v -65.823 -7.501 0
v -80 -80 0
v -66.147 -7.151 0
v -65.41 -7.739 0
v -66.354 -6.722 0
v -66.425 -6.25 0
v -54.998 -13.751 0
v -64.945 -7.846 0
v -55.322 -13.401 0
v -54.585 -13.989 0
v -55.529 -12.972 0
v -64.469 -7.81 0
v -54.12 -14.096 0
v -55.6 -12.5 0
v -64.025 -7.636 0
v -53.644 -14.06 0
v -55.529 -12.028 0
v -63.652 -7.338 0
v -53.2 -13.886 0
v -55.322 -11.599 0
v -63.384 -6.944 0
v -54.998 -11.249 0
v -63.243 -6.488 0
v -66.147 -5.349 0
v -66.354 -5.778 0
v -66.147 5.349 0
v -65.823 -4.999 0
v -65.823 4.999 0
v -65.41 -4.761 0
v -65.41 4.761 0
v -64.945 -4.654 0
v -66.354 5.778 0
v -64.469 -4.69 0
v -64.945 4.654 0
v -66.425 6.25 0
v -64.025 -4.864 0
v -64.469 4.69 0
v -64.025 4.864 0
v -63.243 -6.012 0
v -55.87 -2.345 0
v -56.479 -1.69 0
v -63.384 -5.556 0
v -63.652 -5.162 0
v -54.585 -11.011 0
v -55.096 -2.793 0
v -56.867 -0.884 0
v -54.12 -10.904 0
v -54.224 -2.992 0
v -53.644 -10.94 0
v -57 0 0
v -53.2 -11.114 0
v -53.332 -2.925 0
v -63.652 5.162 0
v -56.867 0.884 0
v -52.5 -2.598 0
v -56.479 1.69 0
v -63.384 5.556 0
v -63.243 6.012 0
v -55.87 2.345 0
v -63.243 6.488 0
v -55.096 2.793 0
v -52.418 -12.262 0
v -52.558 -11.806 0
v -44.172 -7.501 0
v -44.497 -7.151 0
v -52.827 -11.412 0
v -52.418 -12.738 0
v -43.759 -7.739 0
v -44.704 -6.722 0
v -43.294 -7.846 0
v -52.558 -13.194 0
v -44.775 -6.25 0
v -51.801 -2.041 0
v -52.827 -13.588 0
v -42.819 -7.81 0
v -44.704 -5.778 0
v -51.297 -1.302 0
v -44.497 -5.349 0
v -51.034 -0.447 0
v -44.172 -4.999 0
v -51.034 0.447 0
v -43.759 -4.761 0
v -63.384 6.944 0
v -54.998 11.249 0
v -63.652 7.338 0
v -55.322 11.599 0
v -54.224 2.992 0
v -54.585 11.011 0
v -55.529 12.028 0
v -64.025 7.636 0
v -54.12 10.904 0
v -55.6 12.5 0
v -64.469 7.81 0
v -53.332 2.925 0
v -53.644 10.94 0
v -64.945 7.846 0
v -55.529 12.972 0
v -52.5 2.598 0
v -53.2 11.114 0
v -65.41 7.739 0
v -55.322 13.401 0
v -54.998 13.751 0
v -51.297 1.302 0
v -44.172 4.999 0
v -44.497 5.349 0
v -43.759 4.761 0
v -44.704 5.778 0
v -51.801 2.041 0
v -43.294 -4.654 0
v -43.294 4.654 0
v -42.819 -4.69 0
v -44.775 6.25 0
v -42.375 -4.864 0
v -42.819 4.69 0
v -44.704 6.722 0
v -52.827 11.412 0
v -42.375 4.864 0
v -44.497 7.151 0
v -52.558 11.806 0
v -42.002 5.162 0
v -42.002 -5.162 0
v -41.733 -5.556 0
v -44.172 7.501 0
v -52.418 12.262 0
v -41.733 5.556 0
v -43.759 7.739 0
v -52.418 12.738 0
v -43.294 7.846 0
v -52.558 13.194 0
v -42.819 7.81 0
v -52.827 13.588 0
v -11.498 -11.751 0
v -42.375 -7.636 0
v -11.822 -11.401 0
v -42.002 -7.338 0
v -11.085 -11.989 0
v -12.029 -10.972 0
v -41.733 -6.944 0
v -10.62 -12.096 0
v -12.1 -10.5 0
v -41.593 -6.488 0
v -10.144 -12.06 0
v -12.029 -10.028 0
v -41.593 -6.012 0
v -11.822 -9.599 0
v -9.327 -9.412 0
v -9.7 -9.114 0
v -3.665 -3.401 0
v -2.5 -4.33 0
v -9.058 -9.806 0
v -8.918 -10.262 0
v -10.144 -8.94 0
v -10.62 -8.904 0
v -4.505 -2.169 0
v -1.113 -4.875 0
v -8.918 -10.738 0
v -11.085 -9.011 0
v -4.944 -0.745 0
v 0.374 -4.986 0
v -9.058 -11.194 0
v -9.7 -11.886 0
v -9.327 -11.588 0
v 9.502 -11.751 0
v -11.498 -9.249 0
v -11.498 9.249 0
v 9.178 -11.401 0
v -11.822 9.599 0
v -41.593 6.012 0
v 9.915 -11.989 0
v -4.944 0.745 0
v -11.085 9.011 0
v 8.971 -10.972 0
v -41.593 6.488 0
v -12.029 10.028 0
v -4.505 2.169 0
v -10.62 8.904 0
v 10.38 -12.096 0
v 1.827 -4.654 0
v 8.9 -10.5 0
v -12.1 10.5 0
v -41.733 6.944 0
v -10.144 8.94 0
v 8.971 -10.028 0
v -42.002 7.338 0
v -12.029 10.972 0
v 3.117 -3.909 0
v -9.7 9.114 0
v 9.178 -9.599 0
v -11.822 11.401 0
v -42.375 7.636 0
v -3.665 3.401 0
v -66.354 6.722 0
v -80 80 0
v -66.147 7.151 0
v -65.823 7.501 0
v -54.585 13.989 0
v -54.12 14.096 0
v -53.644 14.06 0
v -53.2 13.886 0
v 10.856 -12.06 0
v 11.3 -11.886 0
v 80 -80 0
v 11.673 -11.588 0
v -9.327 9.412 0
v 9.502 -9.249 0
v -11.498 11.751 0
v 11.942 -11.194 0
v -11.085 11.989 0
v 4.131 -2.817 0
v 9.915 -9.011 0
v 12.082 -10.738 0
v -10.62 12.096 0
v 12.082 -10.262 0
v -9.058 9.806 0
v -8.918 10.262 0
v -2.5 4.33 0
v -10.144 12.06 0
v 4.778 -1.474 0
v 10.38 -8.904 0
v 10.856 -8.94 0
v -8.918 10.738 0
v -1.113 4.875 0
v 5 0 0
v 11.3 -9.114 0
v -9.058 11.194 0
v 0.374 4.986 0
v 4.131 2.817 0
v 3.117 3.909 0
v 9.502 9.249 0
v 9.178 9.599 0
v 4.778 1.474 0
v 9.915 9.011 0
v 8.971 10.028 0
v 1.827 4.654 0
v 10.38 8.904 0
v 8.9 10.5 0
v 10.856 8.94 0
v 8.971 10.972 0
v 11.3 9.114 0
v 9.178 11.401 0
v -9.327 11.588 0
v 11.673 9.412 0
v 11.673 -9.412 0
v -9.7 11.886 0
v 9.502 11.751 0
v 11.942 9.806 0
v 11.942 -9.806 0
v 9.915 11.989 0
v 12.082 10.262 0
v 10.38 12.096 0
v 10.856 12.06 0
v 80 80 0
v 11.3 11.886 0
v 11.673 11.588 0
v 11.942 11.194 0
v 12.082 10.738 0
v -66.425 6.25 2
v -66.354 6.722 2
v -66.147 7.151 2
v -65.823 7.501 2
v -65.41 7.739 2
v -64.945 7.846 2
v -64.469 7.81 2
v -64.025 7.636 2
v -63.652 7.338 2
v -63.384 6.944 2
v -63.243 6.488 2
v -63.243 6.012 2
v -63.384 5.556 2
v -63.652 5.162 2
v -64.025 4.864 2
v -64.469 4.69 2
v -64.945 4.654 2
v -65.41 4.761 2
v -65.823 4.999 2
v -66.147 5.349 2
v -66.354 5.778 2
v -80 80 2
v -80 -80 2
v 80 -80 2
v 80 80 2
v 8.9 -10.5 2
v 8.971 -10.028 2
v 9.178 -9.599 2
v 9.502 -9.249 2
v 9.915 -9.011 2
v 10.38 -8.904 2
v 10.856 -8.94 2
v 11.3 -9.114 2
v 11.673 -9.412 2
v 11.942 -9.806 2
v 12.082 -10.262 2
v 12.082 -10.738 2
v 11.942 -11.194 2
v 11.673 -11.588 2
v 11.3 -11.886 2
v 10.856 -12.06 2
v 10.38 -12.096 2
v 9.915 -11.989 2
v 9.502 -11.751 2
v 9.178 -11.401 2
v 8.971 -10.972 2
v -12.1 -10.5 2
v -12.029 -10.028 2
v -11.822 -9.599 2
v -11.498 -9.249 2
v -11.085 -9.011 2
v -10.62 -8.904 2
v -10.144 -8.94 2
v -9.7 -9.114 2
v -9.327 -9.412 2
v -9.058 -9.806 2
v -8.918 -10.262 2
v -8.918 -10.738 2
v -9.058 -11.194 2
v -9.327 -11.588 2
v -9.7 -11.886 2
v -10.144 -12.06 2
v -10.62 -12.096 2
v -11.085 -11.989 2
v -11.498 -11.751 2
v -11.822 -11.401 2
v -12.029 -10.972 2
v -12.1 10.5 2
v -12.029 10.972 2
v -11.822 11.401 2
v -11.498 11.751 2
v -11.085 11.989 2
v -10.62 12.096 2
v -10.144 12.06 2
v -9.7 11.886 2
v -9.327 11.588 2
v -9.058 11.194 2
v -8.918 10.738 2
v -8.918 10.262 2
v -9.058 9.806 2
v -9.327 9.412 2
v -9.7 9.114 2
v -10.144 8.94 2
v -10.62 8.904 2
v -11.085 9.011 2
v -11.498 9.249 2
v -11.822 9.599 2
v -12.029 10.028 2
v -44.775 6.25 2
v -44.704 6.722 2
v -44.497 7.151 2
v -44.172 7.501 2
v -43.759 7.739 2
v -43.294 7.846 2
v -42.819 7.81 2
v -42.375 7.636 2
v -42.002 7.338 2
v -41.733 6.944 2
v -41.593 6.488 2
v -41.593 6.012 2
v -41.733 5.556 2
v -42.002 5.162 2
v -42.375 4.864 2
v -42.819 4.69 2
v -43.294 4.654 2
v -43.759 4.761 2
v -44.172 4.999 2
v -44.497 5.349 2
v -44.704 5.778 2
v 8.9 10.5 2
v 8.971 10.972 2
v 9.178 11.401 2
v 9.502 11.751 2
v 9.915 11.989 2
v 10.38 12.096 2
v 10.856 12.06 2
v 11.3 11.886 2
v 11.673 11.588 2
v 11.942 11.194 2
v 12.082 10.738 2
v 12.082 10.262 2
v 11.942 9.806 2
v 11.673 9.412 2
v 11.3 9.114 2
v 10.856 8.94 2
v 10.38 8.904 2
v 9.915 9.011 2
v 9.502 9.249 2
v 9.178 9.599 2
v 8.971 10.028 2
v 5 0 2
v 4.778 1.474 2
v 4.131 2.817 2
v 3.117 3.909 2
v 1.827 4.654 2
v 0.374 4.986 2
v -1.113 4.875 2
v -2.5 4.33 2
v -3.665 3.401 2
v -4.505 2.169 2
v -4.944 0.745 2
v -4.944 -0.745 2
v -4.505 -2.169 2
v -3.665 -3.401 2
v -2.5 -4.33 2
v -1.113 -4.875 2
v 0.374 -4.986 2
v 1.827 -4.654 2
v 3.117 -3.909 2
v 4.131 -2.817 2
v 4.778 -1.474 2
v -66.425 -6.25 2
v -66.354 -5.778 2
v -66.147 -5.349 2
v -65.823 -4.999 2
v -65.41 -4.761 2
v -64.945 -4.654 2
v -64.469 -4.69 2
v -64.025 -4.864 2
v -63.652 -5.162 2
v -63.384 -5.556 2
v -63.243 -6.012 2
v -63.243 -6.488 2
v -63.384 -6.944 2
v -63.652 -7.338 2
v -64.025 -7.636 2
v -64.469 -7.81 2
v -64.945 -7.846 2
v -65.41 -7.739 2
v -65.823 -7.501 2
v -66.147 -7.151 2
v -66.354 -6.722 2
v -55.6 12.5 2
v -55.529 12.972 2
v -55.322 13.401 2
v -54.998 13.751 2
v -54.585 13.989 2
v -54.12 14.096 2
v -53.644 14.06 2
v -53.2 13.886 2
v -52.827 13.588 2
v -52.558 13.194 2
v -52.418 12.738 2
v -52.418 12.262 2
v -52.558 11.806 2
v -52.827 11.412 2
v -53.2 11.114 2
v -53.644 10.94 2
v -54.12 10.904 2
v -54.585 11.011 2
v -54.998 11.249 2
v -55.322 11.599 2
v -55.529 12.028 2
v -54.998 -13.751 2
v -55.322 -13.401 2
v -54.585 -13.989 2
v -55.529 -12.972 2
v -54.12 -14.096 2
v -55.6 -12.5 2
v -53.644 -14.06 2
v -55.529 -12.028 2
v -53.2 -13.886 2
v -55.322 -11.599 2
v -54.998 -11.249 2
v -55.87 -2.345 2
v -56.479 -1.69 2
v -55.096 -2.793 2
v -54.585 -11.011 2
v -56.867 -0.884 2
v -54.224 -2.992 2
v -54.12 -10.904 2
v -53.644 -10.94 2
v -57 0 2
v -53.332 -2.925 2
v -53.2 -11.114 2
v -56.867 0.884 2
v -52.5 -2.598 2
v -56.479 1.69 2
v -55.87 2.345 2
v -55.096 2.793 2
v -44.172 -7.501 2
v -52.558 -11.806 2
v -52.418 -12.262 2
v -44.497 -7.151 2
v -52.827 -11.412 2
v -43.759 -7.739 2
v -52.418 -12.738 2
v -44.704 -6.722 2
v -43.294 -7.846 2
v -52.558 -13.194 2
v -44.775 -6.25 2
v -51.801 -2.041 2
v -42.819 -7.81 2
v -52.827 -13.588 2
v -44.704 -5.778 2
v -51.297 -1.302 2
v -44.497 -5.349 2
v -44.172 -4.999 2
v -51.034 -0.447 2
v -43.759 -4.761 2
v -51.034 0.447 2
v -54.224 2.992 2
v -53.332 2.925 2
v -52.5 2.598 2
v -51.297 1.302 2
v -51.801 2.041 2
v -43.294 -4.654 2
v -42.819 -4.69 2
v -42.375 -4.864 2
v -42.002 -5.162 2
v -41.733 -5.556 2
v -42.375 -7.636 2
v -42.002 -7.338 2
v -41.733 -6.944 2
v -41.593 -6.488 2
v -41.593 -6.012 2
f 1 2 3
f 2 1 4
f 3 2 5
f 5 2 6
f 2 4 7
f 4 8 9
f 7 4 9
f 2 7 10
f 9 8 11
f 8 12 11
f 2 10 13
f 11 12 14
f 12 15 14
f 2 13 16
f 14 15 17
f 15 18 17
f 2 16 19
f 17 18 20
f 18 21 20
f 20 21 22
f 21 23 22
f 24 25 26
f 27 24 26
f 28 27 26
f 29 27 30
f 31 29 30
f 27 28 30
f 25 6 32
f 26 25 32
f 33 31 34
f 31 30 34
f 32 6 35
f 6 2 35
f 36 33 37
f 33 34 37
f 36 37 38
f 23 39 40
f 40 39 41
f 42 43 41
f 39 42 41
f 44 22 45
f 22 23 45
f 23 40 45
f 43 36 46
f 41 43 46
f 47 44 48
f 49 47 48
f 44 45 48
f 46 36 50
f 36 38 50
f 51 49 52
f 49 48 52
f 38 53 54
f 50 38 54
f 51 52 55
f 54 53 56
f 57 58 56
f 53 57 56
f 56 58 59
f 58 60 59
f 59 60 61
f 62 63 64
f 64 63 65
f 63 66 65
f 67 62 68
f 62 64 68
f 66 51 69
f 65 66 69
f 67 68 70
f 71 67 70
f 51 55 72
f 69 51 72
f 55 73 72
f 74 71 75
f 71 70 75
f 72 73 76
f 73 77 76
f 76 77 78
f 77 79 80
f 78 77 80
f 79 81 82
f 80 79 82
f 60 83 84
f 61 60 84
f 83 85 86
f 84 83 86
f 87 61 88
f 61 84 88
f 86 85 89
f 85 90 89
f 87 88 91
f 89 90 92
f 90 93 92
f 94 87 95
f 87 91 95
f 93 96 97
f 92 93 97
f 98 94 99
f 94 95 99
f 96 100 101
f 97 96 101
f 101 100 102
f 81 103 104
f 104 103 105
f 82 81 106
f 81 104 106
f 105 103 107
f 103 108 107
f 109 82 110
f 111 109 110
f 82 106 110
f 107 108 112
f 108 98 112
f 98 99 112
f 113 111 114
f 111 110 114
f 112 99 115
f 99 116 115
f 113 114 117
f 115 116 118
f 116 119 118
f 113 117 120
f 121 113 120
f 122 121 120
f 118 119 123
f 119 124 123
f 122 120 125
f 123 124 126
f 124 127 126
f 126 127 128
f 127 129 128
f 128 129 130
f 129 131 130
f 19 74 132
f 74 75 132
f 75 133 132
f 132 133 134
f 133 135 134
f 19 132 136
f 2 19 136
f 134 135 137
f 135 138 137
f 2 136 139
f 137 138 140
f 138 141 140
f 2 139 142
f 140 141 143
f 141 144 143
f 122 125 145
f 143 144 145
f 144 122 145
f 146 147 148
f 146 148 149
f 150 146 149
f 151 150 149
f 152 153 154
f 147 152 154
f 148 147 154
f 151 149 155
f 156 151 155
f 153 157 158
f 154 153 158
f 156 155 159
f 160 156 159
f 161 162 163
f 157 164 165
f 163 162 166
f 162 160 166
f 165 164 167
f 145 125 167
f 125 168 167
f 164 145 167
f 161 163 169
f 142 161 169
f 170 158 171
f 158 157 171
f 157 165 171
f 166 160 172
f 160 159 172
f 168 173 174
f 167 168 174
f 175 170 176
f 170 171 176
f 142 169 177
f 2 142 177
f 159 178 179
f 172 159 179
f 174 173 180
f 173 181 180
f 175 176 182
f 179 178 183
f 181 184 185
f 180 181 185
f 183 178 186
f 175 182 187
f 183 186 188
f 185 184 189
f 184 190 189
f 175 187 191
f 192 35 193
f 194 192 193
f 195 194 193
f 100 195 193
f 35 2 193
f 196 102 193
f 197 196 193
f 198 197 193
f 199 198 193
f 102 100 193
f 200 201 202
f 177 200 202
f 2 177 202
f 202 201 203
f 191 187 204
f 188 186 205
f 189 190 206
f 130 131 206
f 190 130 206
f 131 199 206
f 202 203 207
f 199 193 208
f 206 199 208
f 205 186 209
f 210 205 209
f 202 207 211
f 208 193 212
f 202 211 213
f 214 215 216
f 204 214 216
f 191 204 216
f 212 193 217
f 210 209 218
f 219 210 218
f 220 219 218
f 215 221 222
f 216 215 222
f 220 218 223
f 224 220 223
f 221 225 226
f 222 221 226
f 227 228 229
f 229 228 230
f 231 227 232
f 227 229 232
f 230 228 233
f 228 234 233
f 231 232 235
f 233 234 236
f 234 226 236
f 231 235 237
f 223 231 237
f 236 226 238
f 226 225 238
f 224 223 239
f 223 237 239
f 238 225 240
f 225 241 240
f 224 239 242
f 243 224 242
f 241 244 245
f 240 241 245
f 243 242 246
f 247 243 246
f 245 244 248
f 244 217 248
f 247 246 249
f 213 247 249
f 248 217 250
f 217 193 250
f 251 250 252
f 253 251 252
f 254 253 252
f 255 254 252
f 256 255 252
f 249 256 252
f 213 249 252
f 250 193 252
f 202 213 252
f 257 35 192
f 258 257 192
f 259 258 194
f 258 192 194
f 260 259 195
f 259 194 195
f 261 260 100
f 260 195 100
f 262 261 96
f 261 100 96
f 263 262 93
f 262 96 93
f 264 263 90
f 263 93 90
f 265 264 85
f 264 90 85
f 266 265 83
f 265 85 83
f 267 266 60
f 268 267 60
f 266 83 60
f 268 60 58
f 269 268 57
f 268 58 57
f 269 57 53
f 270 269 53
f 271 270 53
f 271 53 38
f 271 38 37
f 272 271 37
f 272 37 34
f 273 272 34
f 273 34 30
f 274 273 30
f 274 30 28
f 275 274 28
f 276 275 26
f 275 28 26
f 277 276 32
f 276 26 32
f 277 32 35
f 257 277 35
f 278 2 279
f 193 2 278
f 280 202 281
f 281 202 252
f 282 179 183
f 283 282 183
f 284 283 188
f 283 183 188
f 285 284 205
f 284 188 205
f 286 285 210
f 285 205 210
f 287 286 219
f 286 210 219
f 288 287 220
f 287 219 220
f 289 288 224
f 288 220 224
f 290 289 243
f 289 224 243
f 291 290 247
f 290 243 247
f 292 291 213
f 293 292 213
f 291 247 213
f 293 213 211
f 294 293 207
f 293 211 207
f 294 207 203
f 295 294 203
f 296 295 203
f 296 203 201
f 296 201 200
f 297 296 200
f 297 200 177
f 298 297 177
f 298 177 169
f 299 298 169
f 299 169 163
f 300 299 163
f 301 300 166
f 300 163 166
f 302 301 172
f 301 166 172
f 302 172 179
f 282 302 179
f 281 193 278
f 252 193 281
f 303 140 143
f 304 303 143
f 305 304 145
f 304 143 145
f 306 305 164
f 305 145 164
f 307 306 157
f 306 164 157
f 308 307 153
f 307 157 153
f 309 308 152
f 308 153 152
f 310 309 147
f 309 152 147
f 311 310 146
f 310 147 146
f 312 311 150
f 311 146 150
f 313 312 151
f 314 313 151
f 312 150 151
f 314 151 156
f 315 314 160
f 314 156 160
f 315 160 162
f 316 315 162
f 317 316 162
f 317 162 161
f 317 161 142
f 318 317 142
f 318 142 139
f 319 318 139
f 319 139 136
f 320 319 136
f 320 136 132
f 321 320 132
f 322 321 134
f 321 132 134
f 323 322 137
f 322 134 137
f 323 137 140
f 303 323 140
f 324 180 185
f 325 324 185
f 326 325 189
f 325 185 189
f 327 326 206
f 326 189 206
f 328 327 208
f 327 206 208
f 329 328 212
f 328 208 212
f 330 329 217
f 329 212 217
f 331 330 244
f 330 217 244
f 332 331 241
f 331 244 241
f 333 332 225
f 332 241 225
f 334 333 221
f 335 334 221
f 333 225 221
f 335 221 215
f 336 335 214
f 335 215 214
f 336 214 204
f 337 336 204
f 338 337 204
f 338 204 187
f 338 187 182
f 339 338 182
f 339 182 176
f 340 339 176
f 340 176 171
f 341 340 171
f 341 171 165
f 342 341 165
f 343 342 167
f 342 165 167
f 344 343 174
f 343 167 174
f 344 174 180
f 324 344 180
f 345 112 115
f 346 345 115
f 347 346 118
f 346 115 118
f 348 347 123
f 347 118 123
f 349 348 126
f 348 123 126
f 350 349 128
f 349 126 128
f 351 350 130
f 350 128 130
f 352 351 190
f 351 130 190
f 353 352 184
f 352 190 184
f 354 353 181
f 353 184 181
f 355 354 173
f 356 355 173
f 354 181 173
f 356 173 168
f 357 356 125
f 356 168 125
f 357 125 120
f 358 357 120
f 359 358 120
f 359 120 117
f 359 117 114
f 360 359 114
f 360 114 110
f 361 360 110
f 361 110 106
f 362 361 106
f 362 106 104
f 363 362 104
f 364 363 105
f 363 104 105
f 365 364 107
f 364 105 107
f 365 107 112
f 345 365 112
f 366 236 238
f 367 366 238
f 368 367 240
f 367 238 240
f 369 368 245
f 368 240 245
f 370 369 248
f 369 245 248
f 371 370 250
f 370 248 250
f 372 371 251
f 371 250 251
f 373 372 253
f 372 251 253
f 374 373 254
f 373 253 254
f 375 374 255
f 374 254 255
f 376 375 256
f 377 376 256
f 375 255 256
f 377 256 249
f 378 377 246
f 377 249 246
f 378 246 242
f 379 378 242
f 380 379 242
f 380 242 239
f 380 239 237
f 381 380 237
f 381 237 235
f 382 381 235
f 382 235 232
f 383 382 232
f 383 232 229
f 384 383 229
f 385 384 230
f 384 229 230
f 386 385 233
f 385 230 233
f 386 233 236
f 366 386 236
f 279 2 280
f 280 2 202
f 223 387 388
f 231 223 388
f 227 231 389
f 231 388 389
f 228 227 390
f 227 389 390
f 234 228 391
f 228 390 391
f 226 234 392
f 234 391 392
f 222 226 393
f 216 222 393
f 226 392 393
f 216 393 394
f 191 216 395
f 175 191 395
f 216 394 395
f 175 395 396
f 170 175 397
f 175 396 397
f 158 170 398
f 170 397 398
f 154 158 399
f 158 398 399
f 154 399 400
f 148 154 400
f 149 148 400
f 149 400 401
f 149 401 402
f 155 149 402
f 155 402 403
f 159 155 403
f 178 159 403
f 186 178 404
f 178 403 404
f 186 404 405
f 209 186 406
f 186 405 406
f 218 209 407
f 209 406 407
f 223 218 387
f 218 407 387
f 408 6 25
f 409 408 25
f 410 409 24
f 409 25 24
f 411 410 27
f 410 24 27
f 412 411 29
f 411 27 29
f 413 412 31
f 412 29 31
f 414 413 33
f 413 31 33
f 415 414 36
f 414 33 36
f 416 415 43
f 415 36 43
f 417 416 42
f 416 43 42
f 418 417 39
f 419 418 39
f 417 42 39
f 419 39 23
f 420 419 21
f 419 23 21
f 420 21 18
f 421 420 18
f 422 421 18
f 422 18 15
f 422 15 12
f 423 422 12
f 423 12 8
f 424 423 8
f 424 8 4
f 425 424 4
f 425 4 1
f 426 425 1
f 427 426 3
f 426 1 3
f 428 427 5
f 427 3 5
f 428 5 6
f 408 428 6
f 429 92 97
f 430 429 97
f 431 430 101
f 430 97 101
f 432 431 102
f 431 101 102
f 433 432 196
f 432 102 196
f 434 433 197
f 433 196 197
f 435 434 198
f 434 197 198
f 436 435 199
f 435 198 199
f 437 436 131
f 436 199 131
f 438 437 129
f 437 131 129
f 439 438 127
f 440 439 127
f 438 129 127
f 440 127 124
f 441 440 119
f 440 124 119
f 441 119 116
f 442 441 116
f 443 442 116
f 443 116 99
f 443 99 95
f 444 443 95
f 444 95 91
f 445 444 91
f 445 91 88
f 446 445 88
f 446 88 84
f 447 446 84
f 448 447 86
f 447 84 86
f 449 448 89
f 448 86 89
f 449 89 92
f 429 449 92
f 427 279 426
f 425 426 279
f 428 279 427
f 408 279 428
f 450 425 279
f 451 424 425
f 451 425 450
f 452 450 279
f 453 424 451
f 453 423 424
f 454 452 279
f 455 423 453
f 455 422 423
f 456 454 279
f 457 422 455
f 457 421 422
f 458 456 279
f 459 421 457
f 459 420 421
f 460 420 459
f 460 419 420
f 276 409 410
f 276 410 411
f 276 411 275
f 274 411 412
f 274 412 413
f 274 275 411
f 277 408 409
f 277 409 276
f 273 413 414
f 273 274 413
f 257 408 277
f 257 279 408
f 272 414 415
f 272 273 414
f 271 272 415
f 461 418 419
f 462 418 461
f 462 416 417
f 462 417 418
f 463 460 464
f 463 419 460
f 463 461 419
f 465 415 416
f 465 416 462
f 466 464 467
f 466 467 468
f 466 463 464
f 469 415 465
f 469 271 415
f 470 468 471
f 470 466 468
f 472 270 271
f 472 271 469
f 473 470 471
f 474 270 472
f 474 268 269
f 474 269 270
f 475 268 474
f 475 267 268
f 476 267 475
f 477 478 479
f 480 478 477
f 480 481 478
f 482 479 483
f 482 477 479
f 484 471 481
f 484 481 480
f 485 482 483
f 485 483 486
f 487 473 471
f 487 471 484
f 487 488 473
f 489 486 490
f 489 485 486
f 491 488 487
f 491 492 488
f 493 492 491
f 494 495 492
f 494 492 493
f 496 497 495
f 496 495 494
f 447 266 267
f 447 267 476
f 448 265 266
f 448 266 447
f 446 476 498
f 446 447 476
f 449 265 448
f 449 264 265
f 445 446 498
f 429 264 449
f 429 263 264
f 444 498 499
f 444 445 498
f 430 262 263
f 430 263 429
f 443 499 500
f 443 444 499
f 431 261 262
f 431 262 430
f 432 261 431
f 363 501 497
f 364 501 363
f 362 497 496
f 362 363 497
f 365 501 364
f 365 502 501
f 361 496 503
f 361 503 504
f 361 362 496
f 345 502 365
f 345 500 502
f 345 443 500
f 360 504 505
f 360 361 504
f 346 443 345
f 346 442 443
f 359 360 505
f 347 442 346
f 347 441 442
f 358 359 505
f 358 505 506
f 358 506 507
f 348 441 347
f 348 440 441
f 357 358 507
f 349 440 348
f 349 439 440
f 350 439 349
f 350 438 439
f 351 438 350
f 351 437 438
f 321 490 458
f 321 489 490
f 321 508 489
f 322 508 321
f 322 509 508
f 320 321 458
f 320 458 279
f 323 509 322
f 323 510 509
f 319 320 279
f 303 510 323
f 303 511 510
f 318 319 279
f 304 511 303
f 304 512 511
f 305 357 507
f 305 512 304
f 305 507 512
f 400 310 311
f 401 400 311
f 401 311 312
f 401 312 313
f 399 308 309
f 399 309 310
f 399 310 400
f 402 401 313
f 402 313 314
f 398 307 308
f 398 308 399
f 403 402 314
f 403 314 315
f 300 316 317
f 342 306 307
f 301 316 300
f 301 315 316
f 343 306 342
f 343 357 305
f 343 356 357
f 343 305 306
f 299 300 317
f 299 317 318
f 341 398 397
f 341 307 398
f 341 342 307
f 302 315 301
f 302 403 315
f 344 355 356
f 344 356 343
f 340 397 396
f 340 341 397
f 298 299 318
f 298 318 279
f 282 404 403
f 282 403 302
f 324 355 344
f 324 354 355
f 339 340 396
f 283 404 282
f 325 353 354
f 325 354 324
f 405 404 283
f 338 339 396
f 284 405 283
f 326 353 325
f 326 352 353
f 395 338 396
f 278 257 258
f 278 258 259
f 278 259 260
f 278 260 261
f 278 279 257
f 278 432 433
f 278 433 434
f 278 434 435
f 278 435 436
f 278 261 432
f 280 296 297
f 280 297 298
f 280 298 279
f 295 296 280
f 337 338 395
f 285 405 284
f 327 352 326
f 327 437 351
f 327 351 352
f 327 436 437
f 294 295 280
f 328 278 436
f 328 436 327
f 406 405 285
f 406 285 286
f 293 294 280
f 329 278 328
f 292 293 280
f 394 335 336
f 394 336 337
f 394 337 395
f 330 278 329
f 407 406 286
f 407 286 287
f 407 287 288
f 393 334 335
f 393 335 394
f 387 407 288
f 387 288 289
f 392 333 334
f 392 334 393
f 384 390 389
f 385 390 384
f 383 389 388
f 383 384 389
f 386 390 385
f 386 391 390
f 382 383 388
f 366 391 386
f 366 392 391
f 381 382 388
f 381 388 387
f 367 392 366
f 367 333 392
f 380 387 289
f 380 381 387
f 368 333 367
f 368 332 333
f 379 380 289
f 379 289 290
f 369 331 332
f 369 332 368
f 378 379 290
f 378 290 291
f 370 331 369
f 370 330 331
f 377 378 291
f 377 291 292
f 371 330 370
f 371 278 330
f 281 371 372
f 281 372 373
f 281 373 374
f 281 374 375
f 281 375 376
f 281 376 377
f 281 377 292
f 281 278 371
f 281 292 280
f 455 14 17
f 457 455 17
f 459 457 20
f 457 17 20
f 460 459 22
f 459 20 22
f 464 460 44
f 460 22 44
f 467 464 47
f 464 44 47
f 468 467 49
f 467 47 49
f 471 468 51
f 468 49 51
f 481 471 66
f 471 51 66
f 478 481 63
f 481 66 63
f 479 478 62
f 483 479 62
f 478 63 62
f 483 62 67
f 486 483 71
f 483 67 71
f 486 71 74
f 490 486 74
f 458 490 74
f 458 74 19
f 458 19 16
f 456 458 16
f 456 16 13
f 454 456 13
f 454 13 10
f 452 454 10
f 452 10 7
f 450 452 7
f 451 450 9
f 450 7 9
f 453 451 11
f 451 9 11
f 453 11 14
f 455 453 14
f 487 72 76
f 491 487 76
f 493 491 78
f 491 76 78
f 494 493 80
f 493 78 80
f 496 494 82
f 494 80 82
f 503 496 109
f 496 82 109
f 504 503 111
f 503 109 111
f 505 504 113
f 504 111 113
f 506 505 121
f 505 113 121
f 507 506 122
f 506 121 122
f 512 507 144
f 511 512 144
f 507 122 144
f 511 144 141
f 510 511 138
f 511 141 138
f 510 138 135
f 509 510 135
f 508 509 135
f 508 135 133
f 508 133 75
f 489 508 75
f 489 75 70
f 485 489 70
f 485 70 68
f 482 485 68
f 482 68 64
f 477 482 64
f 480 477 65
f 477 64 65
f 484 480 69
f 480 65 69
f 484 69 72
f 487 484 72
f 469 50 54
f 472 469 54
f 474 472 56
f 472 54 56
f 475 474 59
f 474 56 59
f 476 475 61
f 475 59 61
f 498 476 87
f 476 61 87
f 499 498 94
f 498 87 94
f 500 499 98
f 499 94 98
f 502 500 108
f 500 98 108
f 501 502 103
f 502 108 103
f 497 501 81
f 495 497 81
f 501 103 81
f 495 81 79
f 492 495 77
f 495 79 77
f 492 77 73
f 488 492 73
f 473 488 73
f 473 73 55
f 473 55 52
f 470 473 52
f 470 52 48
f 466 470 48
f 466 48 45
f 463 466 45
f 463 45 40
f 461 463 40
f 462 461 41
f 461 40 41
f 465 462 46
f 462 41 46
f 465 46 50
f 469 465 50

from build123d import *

# Parameters (mm, degrees)
SKETCH1_W           = 160
SKETCH1_H           = 160
BOSS_EXTRUDE1_DEPTH = 2
SKETCH2_R           = 5
CUT_EXTRUDE1_DEPTH  = 2
SKETCH5_R           = 1.6
CUT_EXTRUDE3_DEPTH  = 2
SKETCH8_R           = 3
SKETCH8_R_2         = 1.6
CUT_EXTRUDE5_DEPTH  = 2


with BuildPart() as part:
    # Sketch1 → Boss-Extrude1 (new body)
    with BuildSketch(Plane.XY):
        Rectangle(SKETCH1_W, SKETCH1_H)
    extrude(amount=BOSS_EXTRUDE1_DEPTH)

    # Sketch2 → Cut-Extrude1 (cut)
    with BuildSketch(Plane.XY.offset(2)):
        Circle(SKETCH2_R)
    extrude(amount=-CUT_EXTRUDE1_DEPTH, mode=Mode.SUBTRACT)

    # Sketch5 → Cut-Extrude3 (cut)
    with BuildSketch(Plane(origin=(0, 0, 0), x_dir=(-1, 0, 0), z_dir=(0, 0, -1))):
        with Locations((10.5, 10.5)):
            Circle(SKETCH5_R)
        with Locations((10.5, -10.5)):
            Circle(SKETCH5_R)
        with Locations((-10.5, -10.5)):
            Circle(SKETCH5_R)
        with Locations((-10.5, 10.5)):
            Circle(SKETCH5_R)
    extrude(amount=-CUT_EXTRUDE3_DEPTH, mode=Mode.SUBTRACT)

    # Sketch8 → Cut-Extrude5 (cut)
    with BuildSketch(Plane(origin=(0, 0, 0), x_dir=(-1, 0, 0), z_dir=(0, 0, -1))):
        with Locations((54, 0)):
            Circle(SKETCH8_R)
        with Locations((54, 12.5)):
            Circle(SKETCH8_R_2)
        with Locations((64.825317547, 6.25)):
            Circle(SKETCH8_R_2)
        with Locations((64.825317547, -6.25)):
            Circle(SKETCH8_R_2)
        with Locations((54, -12.5)):
            Circle(SKETCH8_R_2)
        with Locations((43.174682453, -6.25)):
            Circle(SKETCH8_R_2)
        with Locations((43.174682453, 6.25)):
            Circle(SKETCH8_R_2)
    extrude(amount=-CUT_EXTRUDE5_DEPTH, mode=Mode.SUBTRACT)


solid = part.part
